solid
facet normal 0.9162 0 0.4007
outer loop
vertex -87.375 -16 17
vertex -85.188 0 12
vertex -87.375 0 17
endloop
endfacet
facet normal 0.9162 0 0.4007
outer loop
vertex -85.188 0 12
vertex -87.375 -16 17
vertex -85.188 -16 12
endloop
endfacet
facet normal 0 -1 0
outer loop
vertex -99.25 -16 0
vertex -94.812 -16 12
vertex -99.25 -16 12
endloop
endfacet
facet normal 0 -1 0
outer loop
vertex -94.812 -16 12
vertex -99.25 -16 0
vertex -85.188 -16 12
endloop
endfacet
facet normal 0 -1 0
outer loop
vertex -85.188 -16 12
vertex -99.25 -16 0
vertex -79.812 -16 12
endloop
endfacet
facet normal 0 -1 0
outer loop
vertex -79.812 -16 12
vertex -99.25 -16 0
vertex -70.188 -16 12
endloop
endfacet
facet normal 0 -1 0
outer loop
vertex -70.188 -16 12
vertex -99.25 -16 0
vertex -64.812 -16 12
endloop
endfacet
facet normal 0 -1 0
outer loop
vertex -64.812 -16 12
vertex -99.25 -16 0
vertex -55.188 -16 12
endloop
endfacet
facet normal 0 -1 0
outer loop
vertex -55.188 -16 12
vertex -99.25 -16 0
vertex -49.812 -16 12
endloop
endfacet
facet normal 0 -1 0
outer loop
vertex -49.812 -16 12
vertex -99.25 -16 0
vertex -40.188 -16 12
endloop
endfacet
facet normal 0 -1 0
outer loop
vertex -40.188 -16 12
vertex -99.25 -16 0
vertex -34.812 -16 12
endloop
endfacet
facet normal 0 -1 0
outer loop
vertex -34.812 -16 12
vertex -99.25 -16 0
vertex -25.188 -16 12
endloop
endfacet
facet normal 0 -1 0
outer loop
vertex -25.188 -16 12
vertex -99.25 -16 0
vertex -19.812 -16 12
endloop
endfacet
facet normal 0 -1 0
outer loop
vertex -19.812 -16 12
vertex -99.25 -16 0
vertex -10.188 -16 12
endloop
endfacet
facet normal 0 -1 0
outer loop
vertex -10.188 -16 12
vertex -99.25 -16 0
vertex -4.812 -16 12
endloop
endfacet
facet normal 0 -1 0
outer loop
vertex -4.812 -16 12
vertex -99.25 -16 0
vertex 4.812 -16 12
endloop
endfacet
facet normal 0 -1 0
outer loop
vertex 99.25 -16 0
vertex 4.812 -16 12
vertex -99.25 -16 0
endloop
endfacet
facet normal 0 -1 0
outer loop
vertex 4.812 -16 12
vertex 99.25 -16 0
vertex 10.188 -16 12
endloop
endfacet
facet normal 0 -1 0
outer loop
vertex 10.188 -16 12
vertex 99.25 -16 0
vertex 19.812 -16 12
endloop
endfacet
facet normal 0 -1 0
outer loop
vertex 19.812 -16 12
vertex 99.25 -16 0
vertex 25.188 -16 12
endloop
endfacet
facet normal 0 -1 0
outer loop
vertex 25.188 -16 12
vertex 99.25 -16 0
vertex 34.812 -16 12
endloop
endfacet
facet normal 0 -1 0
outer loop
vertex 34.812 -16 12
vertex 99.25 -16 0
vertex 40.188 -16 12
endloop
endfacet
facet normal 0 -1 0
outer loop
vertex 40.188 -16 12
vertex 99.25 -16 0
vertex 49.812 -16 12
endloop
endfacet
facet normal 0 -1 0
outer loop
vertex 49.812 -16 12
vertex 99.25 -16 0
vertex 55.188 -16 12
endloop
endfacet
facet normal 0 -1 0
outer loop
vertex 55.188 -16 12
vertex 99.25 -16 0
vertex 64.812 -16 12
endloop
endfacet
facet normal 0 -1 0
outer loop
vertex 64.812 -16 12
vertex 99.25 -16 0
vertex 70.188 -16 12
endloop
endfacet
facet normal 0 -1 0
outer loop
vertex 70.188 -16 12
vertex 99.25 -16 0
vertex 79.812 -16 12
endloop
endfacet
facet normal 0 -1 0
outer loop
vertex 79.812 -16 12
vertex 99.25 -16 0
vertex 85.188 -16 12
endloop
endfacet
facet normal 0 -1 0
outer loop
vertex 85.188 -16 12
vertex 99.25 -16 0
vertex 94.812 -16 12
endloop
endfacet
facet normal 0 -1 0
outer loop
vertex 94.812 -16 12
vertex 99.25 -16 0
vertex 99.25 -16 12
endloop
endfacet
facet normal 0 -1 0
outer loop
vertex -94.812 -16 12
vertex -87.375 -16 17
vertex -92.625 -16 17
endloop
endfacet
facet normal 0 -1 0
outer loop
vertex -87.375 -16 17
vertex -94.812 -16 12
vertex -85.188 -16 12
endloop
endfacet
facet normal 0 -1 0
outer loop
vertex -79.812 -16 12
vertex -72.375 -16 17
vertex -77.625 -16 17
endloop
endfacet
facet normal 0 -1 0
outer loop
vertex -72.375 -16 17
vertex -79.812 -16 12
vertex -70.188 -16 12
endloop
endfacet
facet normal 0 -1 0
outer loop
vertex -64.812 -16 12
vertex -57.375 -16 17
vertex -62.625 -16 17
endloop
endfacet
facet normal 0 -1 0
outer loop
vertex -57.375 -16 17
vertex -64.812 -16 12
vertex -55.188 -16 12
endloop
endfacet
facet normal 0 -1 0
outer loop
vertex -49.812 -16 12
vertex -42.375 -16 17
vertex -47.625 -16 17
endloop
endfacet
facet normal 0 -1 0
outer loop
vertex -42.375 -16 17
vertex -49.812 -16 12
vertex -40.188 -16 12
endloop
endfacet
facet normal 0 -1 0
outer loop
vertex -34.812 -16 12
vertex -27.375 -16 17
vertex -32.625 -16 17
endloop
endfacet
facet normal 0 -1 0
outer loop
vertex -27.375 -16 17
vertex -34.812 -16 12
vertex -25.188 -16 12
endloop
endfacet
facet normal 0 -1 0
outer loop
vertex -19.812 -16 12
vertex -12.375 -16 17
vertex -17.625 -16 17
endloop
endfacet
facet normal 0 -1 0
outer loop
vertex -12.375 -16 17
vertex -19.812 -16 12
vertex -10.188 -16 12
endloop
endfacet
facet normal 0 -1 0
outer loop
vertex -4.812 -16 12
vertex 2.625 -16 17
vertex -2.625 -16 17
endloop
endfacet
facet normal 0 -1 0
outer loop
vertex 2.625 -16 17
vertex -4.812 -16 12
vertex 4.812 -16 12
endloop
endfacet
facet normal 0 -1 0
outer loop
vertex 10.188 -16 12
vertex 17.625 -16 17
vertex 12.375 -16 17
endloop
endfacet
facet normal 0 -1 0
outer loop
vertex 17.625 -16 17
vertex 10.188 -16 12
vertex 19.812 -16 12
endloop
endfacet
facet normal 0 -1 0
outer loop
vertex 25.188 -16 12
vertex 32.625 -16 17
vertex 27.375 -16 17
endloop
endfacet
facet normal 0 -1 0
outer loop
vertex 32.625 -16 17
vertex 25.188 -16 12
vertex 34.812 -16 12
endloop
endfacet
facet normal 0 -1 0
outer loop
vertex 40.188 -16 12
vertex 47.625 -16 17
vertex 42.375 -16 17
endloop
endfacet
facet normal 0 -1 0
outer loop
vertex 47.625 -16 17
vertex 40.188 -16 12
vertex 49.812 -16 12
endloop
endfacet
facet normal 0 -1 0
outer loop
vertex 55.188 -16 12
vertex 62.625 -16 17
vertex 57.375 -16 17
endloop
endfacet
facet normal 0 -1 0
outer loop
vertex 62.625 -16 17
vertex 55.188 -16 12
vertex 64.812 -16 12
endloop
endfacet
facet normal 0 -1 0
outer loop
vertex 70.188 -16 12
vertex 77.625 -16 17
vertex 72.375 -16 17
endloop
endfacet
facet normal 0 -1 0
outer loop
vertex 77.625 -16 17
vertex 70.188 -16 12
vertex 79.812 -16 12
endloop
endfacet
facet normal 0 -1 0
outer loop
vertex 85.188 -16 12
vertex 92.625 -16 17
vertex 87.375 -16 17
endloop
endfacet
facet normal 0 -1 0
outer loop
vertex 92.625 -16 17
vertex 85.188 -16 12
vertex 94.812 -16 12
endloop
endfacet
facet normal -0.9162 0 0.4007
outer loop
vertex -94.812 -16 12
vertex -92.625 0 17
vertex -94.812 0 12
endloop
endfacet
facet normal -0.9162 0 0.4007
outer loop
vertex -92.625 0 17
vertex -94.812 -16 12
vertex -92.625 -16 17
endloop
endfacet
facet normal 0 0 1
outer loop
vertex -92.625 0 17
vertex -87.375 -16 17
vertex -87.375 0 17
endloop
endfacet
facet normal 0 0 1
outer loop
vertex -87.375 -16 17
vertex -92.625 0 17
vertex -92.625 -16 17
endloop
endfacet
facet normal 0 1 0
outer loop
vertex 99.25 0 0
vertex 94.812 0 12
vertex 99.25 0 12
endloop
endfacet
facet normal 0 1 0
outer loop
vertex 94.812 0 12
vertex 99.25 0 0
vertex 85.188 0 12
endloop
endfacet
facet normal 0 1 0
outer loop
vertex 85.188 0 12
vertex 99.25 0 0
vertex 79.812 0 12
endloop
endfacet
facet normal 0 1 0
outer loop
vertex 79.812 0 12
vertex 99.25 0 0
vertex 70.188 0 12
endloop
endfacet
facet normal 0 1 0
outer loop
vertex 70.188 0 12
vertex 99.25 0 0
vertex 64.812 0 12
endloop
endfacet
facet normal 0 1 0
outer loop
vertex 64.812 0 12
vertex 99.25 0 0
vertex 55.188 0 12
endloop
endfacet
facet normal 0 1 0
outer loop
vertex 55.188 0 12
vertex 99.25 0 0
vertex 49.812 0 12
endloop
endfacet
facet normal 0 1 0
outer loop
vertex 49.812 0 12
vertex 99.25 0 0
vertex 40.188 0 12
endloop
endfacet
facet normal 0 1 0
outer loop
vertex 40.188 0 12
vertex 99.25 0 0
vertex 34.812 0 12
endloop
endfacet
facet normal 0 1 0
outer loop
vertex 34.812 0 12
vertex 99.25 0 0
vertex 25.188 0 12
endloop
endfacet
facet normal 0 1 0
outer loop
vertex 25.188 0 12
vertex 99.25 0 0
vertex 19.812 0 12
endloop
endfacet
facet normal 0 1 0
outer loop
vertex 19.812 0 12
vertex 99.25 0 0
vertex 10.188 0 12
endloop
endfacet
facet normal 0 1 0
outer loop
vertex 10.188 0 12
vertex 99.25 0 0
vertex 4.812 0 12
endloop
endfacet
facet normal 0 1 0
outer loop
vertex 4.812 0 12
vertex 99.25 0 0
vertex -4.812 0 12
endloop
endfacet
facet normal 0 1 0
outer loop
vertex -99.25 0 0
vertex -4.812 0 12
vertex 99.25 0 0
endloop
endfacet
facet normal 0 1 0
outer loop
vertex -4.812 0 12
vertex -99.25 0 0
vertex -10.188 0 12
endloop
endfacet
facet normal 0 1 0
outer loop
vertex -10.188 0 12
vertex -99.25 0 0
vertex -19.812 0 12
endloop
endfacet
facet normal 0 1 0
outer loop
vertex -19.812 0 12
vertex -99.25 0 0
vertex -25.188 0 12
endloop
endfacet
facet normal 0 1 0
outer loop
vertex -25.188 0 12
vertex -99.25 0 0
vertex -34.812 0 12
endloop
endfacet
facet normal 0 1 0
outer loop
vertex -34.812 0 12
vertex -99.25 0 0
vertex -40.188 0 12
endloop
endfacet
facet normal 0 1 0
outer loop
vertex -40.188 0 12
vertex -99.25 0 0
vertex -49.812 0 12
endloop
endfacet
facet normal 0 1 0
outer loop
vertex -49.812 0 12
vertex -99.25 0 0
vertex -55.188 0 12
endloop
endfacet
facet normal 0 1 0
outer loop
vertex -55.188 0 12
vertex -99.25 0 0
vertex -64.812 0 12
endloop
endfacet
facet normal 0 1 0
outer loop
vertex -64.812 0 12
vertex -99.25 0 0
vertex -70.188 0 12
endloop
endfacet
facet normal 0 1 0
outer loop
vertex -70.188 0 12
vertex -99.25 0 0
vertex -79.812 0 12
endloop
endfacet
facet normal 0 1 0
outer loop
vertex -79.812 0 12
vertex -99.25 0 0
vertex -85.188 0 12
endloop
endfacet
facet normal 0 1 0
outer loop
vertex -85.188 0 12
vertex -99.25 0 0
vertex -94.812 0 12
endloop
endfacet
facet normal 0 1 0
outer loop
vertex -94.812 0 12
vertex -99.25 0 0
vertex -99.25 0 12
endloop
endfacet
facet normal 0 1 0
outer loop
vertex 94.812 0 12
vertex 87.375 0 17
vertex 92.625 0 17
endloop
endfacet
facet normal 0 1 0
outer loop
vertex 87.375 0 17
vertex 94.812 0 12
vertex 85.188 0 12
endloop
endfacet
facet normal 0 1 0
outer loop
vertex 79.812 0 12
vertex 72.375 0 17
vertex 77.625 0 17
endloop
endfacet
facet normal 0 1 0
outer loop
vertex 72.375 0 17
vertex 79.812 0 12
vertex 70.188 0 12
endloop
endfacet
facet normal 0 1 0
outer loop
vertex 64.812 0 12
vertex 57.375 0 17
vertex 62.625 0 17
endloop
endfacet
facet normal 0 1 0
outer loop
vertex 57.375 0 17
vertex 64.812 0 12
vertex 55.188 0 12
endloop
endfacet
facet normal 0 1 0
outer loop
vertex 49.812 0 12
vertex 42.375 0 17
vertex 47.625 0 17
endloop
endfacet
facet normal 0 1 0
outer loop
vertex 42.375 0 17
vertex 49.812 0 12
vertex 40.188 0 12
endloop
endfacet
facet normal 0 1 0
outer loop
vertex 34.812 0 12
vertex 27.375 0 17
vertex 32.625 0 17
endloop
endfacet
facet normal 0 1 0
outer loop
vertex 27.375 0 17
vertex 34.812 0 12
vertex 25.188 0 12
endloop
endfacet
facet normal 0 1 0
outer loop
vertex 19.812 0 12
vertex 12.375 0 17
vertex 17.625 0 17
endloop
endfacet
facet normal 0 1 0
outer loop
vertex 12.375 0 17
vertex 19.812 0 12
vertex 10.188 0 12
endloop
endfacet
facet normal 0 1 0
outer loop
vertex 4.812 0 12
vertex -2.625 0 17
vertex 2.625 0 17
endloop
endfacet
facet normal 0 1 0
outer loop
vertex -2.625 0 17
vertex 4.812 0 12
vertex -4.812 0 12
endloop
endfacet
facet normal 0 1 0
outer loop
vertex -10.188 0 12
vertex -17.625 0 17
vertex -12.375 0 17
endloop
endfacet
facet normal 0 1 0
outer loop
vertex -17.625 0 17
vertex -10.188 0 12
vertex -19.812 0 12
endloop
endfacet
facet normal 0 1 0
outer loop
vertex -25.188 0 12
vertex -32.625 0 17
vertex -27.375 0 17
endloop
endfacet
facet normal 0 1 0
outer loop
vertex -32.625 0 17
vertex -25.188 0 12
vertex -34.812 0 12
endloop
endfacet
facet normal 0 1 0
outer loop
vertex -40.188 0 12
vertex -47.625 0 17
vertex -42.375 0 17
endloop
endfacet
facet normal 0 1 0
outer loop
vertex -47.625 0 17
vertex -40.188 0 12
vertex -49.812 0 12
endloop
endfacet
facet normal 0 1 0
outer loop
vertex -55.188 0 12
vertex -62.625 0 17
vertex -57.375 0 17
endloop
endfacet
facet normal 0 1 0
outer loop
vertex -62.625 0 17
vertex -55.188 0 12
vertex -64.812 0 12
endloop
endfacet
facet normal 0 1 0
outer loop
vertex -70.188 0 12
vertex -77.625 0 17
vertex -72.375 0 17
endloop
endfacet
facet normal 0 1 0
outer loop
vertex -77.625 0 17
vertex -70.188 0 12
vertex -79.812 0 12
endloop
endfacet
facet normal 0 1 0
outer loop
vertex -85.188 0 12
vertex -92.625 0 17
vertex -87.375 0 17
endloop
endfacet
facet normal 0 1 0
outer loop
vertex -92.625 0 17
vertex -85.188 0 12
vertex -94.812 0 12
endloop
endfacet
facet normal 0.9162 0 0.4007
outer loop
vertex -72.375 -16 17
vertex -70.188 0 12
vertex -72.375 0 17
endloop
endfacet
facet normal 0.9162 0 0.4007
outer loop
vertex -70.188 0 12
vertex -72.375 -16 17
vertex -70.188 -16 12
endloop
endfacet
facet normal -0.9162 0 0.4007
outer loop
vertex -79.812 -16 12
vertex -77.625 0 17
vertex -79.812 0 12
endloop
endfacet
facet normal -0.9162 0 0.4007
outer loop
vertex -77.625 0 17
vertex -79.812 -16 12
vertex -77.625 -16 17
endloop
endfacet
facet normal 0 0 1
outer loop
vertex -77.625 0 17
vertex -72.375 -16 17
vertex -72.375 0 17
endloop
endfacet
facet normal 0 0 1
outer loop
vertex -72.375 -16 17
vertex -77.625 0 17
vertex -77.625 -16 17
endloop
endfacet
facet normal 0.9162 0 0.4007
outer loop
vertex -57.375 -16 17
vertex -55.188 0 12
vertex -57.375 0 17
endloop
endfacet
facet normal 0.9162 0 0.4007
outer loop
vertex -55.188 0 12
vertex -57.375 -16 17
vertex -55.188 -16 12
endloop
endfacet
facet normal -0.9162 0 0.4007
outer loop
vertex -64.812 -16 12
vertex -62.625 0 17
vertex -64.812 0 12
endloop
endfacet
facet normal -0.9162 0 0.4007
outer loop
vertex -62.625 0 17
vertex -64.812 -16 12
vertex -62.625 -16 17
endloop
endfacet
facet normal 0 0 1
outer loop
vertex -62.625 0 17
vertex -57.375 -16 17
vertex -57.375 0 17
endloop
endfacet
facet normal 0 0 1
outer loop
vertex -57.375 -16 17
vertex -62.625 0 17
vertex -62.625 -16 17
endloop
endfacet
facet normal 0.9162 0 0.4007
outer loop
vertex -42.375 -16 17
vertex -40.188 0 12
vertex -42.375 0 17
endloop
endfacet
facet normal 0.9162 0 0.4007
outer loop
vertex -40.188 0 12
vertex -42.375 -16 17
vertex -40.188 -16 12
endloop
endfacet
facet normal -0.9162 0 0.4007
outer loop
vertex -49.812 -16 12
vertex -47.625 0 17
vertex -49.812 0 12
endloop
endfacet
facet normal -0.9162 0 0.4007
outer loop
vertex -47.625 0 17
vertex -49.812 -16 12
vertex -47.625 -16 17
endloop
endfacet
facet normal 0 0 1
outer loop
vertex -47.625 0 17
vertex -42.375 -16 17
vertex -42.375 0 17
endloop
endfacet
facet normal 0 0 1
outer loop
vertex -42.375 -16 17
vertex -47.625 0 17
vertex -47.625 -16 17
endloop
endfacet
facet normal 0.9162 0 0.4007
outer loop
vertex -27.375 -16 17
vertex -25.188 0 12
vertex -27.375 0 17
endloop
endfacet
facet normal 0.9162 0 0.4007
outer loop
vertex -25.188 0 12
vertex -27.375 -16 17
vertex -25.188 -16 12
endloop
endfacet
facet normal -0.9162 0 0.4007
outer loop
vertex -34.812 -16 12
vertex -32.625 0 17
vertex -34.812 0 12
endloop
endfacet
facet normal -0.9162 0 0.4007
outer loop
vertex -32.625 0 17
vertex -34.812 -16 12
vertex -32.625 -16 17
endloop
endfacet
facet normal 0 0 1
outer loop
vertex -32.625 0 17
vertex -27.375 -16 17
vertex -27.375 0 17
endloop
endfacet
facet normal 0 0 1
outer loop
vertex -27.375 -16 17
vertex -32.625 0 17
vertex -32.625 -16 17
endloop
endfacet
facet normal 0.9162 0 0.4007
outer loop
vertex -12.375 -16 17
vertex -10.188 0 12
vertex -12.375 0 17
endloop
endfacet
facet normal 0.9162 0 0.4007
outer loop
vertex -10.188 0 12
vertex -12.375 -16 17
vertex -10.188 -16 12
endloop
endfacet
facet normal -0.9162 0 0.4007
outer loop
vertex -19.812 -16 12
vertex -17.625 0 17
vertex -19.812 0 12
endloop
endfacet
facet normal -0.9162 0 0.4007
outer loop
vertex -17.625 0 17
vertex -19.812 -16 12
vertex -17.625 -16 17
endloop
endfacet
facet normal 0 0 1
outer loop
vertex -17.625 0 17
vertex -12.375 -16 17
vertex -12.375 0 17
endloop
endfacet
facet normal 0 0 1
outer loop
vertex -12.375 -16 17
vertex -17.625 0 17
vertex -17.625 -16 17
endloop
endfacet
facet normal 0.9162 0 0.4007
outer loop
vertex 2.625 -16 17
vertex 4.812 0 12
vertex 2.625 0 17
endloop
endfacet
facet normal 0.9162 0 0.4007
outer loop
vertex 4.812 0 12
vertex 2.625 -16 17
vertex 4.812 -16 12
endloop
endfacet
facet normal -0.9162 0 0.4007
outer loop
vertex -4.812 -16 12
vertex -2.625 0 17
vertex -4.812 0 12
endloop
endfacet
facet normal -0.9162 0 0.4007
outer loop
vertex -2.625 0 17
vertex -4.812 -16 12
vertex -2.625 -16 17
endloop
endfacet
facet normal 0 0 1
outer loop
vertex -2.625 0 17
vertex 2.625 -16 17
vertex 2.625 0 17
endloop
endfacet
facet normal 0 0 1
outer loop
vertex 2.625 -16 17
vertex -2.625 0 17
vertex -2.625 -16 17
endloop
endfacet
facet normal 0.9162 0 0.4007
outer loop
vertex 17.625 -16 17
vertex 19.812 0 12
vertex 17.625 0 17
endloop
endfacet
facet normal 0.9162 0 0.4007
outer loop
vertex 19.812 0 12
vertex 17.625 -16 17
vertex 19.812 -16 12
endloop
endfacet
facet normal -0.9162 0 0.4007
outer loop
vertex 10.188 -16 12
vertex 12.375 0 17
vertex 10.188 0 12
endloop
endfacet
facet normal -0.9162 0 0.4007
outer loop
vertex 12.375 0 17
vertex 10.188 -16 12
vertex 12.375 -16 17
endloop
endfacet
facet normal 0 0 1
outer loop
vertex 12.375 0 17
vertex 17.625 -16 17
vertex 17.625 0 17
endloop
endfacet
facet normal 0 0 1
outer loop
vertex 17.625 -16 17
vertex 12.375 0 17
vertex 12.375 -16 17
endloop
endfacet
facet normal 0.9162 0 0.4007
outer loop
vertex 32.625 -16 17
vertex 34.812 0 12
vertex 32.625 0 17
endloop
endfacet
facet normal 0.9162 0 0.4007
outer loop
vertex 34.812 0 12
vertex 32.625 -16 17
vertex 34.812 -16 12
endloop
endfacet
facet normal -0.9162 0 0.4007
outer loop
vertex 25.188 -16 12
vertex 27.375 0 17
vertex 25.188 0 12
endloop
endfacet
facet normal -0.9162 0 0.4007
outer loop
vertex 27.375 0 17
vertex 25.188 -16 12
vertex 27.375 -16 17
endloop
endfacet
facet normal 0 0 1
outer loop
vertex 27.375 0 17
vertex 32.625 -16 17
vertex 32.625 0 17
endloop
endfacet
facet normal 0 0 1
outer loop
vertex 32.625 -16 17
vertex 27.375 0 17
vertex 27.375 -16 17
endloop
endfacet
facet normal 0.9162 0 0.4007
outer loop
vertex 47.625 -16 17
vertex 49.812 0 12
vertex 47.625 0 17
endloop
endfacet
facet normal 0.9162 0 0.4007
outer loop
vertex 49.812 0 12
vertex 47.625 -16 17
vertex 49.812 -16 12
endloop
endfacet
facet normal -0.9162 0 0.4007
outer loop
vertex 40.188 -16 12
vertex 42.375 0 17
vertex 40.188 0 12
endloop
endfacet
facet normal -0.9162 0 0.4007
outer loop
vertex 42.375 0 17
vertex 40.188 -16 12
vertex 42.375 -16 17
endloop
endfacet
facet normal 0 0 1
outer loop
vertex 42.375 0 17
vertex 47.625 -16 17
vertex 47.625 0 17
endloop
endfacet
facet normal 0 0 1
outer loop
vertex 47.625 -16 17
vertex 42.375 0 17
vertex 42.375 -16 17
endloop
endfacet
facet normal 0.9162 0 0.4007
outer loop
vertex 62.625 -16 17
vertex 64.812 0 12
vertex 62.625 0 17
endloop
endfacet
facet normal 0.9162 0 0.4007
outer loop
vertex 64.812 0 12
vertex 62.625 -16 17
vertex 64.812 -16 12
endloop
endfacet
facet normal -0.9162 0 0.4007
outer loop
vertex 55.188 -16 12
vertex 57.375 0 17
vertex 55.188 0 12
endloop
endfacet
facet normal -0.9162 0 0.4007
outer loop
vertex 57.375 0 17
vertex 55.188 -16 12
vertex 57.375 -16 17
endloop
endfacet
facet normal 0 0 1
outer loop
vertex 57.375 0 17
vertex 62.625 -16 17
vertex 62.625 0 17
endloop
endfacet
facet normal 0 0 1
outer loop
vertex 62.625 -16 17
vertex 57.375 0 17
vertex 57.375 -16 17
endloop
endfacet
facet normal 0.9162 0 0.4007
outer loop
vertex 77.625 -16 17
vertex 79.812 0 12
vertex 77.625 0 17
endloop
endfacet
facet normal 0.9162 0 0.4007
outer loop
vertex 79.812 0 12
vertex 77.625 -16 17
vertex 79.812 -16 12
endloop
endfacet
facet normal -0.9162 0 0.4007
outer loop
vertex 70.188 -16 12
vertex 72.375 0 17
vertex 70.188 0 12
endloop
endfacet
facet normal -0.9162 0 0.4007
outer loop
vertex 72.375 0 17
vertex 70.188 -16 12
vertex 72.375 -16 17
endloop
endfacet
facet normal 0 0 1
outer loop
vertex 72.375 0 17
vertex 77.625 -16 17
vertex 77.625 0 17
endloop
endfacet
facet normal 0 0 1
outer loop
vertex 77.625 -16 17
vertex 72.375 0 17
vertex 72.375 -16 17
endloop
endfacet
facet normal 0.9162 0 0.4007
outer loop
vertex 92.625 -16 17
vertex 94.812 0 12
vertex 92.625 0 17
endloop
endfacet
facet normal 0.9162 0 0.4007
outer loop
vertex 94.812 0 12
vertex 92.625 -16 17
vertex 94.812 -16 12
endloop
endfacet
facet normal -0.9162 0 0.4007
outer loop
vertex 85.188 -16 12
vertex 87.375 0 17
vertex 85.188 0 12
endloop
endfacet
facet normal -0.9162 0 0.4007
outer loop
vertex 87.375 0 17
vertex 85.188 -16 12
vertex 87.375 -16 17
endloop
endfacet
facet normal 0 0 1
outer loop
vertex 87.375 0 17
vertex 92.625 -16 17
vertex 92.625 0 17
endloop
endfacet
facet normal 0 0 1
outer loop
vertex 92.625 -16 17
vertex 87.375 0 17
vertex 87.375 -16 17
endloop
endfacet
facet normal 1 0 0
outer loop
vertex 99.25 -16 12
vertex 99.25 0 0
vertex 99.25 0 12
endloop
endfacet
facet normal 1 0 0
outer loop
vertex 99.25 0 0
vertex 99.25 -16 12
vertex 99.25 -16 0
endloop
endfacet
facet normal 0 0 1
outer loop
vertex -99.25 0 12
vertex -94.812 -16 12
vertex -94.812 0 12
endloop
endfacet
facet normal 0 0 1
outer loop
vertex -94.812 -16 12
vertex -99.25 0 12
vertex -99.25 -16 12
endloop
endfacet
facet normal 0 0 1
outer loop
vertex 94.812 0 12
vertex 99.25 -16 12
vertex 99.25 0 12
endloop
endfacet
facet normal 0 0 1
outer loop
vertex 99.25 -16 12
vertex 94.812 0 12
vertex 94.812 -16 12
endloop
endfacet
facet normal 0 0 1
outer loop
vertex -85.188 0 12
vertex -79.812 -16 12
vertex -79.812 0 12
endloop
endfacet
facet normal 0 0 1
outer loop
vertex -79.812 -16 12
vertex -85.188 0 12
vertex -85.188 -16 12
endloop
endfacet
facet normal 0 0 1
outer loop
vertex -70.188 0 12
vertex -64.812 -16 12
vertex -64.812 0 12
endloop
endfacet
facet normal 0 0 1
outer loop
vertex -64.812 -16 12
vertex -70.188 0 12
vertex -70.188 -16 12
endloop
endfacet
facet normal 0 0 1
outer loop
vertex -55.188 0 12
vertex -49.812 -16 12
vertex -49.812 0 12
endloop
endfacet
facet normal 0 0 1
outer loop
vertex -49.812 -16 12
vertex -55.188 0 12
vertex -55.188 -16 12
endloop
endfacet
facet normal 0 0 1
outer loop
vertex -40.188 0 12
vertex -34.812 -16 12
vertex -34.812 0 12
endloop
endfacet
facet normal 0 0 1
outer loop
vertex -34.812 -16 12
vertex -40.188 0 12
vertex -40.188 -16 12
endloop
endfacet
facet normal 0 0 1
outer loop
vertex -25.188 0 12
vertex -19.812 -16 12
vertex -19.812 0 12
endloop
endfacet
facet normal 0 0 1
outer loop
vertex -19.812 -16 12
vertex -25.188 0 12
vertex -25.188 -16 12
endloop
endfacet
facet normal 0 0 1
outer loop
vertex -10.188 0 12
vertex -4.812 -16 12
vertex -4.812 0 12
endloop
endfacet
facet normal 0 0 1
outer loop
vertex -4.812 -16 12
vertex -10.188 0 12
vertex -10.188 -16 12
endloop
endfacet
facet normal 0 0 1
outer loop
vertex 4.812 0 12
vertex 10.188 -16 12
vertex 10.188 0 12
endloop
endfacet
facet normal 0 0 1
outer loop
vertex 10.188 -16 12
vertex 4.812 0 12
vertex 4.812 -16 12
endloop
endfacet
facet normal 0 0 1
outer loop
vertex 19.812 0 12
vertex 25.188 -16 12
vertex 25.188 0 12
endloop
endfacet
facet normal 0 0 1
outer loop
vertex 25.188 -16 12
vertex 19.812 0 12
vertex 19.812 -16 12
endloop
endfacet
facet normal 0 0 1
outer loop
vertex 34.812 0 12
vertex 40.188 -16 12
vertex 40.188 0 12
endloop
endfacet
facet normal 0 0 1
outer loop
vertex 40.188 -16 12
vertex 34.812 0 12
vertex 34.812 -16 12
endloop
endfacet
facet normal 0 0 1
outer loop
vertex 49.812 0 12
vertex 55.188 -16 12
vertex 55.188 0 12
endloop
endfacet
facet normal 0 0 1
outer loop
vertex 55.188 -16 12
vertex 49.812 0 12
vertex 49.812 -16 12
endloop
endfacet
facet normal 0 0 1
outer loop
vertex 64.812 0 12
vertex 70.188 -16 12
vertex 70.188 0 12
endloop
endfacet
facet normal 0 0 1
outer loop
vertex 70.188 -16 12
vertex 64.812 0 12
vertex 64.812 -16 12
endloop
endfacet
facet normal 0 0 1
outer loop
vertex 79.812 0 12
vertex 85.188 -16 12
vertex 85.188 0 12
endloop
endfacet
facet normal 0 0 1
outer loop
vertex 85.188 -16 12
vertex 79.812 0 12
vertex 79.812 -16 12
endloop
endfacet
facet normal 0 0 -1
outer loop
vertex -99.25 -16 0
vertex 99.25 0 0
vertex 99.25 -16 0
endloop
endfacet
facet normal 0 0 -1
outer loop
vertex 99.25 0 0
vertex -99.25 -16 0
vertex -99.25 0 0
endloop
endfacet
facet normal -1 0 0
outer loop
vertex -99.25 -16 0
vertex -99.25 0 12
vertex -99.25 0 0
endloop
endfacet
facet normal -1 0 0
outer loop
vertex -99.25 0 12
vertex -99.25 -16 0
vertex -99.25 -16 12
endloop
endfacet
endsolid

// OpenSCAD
$fn = 32;

// ----------------------------------------------------------------------
// Toothed rack, 13 teeth
// 15 mm pitch, 5 mm teeth
// ----------------------------------------------------------------------

// --- parameters (mm) ---
bar_w = 16;      // bar width (Y)
bar_h = 12;      // bar height (Z)
teeth = 13;      // number of teeth
pitch = 15;      // tooth pitch
tooth_h = 5;     // tooth height above the bar
root_w = 10.5;   // tooth width at the root
crest_w = 5.25;  // tooth width at the crest

// --- derived feature positions (mm) ---
span = (teeth - 1) * pitch;  // = 180   distance between the outer teeth
bar_l = span + root_w + 8;   // = 198.5   bar length: teeth plus 4 mm at each end
tooth_x = -span / 2;         // = -90   X of the first tooth
height = bar_h + tooth_h;    // = 17   overall height
feature_centers = [
  [tooth_x + 0 * pitch, -bar_w / 2],
  [tooth_x + 1 * pitch, -bar_w / 2],
  [tooth_x + 2 * pitch, -bar_w / 2],
  [tooth_x + 3 * pitch, -bar_w / 2],
  [tooth_x + 4 * pitch, -bar_w / 2],
  [tooth_x + 5 * pitch, -bar_w / 2],
  [tooth_x + 6 * pitch, -bar_w / 2],
  [tooth_x + 7 * pitch, -bar_w / 2],
  [tooth_x + 8 * pitch, -bar_w / 2],
  [tooth_x + 9 * pitch, -bar_w / 2],
  [tooth_x + 10 * pitch, -bar_w / 2],
  [tooth_x + 11 * pitch, -bar_w / 2],
  [tooth_x + 12 * pitch, -bar_w / 2]
];   // tooth centre line, drives the tooth loop

// bar with a rack of teeth, one extruded trapezoium per centre
module rack_tooth() {
  linear_extrude(height = bar_w)
    polygon(points = [
      [0, 0],
      [root_w, 0],
      [root_w / 2 + crest_w / 2, tooth_h + 1],
      [root_w / 2 - crest_w / 2, tooth_h + 1]
    ]);
}

union() {
  translate([-bar_l / 2, -bar_w, 0]) cube([bar_l, bar_w, bar_h]);
  for (centre = feature_centers)
    translate([centre[0] - root_w / 2, 0, bar_h - 1]) rotate([90, 0, 0]) rack_tooth();
}
